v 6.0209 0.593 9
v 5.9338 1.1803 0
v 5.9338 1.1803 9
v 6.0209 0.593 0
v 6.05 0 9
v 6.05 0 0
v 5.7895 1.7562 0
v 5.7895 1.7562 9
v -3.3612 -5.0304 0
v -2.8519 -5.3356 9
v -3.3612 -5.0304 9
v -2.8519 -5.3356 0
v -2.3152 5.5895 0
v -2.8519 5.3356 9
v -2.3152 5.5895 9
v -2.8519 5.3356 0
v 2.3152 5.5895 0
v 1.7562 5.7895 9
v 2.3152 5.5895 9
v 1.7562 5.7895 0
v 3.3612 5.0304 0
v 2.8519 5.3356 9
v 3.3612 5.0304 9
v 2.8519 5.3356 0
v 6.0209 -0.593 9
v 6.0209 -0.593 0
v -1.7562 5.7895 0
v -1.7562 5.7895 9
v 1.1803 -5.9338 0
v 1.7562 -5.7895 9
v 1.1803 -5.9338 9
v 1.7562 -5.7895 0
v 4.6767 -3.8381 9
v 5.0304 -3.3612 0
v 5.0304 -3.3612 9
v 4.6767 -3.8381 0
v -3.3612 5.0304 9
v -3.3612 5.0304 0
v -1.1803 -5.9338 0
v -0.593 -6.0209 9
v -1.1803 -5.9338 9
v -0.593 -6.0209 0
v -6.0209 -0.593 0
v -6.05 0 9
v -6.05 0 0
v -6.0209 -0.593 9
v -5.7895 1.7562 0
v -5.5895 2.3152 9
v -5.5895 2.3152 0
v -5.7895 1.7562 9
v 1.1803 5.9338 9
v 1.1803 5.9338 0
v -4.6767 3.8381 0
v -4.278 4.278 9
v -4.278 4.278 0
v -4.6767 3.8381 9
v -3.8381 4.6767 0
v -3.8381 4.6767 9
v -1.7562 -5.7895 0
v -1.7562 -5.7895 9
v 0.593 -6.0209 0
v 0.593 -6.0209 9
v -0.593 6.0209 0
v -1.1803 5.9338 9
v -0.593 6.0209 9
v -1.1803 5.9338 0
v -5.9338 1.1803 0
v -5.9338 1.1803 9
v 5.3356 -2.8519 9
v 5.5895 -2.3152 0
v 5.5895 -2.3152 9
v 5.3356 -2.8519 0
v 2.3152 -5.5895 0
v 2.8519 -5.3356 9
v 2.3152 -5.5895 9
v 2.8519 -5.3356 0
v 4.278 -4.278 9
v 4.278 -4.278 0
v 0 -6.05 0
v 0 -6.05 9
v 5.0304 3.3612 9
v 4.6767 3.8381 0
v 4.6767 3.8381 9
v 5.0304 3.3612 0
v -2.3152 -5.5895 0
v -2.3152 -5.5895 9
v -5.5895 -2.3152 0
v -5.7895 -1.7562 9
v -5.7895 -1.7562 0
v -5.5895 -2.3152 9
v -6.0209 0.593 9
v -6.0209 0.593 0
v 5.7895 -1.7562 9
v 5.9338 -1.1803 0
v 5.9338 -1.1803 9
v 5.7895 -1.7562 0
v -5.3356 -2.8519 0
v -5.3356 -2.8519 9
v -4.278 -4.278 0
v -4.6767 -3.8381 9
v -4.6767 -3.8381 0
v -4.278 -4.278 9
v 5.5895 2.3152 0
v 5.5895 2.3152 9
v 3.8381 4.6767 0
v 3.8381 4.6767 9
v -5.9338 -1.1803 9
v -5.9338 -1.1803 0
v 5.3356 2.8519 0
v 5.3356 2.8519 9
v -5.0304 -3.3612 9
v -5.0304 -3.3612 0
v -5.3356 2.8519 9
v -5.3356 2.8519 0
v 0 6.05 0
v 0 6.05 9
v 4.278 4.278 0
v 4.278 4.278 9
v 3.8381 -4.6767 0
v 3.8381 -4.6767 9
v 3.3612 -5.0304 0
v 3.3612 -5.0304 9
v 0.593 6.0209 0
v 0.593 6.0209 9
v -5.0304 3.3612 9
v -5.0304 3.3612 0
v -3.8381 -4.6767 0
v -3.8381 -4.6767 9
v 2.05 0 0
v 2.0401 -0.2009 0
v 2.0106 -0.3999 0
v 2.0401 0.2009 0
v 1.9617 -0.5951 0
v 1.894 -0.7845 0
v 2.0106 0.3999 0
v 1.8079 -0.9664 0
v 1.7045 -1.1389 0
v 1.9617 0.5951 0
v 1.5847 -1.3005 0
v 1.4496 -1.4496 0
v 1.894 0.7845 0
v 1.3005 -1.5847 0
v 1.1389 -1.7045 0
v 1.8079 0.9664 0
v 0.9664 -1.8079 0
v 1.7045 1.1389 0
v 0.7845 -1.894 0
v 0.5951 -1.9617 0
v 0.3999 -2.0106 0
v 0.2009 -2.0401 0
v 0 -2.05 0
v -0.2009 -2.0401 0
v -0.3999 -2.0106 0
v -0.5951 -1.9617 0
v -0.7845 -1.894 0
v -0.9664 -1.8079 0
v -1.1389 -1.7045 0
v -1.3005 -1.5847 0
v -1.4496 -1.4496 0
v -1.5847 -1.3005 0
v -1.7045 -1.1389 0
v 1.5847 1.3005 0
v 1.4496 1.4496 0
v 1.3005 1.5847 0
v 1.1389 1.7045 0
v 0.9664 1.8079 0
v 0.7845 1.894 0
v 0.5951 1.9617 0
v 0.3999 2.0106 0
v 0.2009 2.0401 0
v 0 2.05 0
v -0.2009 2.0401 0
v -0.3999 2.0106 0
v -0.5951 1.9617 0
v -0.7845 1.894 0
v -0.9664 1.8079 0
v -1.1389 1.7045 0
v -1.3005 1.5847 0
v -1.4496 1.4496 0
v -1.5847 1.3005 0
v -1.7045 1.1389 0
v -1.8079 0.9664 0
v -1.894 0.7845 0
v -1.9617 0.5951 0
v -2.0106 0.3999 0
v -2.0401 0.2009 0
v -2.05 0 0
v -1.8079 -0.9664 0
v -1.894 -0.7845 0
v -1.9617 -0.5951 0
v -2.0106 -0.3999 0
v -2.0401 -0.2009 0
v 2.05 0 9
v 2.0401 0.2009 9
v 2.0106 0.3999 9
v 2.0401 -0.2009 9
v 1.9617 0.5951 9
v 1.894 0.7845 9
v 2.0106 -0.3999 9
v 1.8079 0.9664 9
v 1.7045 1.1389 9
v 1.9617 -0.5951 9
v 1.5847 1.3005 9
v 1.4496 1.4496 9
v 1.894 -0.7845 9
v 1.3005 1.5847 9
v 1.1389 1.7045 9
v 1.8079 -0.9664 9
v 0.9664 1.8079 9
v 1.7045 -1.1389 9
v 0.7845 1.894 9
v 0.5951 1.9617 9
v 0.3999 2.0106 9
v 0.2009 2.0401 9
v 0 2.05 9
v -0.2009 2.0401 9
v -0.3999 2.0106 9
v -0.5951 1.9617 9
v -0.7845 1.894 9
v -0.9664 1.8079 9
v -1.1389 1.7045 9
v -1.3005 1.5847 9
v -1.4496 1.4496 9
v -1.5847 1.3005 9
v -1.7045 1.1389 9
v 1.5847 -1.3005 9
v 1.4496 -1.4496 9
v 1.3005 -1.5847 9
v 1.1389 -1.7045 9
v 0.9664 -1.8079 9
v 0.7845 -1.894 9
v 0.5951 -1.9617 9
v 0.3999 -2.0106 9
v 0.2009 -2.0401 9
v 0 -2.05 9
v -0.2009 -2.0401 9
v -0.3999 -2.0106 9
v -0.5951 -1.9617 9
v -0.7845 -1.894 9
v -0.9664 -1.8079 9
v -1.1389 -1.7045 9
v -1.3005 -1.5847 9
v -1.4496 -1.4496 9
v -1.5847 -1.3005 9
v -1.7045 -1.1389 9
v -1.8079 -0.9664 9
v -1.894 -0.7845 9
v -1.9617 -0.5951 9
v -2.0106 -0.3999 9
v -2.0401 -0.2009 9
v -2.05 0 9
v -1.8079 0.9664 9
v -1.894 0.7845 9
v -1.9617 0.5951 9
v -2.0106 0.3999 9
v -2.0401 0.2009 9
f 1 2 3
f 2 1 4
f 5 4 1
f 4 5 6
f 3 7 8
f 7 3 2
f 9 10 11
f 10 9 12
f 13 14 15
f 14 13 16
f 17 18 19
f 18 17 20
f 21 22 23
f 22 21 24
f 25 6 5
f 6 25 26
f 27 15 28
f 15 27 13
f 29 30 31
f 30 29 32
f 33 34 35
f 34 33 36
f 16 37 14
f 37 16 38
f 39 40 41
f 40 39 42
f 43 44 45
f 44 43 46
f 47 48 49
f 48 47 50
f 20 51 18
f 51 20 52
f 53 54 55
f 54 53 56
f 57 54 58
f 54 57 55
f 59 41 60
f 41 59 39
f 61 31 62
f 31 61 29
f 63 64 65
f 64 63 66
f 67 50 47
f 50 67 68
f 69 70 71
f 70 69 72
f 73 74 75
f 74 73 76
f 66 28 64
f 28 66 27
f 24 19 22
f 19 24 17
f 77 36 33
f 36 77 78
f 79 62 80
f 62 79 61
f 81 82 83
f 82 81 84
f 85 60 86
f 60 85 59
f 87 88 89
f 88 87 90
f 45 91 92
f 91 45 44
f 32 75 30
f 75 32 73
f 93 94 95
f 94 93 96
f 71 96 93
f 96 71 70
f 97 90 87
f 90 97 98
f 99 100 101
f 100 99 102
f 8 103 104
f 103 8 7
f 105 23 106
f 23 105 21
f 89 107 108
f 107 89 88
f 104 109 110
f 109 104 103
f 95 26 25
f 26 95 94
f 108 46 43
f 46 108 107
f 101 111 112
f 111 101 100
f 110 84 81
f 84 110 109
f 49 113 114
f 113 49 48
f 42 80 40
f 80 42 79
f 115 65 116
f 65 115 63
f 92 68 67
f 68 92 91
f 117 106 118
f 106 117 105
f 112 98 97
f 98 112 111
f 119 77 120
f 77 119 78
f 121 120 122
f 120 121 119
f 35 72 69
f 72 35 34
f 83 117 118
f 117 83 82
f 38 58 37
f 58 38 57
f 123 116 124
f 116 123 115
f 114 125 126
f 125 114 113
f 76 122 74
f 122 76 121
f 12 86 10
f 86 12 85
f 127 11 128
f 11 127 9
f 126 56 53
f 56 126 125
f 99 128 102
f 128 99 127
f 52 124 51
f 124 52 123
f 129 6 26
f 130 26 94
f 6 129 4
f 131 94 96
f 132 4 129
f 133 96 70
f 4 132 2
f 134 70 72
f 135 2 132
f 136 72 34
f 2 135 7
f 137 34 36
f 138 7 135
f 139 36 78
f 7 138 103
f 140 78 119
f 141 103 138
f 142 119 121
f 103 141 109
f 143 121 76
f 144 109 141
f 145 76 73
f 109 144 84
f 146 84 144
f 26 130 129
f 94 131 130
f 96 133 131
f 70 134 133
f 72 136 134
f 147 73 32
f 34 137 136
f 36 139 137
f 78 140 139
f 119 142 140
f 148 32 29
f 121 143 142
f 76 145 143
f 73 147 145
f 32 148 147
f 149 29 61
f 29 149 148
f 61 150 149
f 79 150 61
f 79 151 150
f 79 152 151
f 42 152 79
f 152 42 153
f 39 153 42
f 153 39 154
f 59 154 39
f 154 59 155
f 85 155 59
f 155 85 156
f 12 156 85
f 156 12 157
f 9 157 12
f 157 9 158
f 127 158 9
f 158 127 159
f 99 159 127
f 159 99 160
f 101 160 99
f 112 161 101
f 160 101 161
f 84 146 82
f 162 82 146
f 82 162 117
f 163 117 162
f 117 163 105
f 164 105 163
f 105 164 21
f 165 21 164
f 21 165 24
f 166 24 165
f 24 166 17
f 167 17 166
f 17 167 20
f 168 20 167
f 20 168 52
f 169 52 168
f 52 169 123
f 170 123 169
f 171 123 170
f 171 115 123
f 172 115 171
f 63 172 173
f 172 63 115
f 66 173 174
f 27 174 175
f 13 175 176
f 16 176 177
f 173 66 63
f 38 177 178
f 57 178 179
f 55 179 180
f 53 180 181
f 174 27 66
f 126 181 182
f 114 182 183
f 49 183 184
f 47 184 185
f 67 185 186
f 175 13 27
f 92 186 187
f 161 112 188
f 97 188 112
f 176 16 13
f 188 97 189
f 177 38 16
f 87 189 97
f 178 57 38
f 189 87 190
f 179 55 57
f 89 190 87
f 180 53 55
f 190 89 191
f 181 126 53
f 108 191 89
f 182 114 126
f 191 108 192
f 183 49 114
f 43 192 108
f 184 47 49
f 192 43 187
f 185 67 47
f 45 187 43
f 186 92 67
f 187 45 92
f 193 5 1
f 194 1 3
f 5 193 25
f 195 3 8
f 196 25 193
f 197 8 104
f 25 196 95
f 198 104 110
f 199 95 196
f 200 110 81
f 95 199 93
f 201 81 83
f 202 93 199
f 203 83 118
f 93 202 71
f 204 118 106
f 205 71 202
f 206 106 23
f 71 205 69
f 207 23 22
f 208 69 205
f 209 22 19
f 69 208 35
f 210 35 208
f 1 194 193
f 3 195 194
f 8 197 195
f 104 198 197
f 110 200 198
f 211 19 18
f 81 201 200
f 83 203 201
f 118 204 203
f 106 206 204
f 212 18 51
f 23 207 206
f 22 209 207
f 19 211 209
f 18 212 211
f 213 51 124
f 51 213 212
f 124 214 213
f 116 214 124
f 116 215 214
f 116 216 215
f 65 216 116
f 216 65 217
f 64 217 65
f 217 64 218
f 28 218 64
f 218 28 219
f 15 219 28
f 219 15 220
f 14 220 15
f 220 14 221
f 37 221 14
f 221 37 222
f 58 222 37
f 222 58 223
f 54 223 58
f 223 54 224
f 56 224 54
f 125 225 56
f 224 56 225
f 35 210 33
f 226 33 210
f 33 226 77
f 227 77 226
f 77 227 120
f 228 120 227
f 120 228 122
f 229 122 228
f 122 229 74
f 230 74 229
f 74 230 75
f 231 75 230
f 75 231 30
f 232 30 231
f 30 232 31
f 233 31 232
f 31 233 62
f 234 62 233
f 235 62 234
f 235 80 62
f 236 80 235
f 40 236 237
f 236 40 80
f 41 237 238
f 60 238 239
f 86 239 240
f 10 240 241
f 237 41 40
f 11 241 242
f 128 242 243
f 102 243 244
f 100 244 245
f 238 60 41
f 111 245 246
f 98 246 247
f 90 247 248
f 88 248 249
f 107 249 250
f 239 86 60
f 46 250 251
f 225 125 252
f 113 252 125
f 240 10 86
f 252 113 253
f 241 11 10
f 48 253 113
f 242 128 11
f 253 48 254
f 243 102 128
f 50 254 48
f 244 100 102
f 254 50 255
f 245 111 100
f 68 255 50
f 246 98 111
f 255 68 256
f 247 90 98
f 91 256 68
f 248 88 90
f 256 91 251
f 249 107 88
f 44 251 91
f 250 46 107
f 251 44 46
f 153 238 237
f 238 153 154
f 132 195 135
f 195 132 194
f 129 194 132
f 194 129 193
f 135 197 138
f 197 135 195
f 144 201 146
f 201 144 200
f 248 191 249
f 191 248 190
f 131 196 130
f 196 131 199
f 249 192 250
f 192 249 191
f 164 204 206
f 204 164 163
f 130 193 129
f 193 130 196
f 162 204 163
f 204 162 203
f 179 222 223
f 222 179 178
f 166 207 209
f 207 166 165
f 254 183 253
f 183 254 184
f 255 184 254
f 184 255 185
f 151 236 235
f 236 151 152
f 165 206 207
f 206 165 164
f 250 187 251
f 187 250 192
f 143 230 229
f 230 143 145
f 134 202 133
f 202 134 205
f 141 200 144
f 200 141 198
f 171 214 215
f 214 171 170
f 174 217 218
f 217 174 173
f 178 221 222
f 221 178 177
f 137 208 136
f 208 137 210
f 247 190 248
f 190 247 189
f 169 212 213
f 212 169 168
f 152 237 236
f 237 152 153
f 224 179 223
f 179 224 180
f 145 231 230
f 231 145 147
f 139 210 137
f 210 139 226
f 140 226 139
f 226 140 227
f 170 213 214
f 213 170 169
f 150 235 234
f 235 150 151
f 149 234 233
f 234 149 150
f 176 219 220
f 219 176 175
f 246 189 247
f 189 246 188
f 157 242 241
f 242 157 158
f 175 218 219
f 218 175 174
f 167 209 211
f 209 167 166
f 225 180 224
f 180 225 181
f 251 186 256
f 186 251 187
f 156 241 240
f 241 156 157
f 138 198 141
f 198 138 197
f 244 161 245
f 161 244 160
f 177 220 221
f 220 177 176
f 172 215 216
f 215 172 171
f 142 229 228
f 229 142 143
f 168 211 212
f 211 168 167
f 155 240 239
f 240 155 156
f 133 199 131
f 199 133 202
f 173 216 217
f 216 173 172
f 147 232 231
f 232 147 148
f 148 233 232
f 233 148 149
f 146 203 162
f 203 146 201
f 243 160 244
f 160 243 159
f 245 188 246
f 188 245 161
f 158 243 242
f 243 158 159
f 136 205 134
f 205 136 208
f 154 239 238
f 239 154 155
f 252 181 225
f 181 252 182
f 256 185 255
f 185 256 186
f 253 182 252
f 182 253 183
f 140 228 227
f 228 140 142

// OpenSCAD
space_h=9;
d=4.1;
t=4;

res=64;

difference(){
  cylinder(d=d+2*t, h=space_h, $fn=res);
  cylinder(d=d, h=space_h, $fn=res);
  }
